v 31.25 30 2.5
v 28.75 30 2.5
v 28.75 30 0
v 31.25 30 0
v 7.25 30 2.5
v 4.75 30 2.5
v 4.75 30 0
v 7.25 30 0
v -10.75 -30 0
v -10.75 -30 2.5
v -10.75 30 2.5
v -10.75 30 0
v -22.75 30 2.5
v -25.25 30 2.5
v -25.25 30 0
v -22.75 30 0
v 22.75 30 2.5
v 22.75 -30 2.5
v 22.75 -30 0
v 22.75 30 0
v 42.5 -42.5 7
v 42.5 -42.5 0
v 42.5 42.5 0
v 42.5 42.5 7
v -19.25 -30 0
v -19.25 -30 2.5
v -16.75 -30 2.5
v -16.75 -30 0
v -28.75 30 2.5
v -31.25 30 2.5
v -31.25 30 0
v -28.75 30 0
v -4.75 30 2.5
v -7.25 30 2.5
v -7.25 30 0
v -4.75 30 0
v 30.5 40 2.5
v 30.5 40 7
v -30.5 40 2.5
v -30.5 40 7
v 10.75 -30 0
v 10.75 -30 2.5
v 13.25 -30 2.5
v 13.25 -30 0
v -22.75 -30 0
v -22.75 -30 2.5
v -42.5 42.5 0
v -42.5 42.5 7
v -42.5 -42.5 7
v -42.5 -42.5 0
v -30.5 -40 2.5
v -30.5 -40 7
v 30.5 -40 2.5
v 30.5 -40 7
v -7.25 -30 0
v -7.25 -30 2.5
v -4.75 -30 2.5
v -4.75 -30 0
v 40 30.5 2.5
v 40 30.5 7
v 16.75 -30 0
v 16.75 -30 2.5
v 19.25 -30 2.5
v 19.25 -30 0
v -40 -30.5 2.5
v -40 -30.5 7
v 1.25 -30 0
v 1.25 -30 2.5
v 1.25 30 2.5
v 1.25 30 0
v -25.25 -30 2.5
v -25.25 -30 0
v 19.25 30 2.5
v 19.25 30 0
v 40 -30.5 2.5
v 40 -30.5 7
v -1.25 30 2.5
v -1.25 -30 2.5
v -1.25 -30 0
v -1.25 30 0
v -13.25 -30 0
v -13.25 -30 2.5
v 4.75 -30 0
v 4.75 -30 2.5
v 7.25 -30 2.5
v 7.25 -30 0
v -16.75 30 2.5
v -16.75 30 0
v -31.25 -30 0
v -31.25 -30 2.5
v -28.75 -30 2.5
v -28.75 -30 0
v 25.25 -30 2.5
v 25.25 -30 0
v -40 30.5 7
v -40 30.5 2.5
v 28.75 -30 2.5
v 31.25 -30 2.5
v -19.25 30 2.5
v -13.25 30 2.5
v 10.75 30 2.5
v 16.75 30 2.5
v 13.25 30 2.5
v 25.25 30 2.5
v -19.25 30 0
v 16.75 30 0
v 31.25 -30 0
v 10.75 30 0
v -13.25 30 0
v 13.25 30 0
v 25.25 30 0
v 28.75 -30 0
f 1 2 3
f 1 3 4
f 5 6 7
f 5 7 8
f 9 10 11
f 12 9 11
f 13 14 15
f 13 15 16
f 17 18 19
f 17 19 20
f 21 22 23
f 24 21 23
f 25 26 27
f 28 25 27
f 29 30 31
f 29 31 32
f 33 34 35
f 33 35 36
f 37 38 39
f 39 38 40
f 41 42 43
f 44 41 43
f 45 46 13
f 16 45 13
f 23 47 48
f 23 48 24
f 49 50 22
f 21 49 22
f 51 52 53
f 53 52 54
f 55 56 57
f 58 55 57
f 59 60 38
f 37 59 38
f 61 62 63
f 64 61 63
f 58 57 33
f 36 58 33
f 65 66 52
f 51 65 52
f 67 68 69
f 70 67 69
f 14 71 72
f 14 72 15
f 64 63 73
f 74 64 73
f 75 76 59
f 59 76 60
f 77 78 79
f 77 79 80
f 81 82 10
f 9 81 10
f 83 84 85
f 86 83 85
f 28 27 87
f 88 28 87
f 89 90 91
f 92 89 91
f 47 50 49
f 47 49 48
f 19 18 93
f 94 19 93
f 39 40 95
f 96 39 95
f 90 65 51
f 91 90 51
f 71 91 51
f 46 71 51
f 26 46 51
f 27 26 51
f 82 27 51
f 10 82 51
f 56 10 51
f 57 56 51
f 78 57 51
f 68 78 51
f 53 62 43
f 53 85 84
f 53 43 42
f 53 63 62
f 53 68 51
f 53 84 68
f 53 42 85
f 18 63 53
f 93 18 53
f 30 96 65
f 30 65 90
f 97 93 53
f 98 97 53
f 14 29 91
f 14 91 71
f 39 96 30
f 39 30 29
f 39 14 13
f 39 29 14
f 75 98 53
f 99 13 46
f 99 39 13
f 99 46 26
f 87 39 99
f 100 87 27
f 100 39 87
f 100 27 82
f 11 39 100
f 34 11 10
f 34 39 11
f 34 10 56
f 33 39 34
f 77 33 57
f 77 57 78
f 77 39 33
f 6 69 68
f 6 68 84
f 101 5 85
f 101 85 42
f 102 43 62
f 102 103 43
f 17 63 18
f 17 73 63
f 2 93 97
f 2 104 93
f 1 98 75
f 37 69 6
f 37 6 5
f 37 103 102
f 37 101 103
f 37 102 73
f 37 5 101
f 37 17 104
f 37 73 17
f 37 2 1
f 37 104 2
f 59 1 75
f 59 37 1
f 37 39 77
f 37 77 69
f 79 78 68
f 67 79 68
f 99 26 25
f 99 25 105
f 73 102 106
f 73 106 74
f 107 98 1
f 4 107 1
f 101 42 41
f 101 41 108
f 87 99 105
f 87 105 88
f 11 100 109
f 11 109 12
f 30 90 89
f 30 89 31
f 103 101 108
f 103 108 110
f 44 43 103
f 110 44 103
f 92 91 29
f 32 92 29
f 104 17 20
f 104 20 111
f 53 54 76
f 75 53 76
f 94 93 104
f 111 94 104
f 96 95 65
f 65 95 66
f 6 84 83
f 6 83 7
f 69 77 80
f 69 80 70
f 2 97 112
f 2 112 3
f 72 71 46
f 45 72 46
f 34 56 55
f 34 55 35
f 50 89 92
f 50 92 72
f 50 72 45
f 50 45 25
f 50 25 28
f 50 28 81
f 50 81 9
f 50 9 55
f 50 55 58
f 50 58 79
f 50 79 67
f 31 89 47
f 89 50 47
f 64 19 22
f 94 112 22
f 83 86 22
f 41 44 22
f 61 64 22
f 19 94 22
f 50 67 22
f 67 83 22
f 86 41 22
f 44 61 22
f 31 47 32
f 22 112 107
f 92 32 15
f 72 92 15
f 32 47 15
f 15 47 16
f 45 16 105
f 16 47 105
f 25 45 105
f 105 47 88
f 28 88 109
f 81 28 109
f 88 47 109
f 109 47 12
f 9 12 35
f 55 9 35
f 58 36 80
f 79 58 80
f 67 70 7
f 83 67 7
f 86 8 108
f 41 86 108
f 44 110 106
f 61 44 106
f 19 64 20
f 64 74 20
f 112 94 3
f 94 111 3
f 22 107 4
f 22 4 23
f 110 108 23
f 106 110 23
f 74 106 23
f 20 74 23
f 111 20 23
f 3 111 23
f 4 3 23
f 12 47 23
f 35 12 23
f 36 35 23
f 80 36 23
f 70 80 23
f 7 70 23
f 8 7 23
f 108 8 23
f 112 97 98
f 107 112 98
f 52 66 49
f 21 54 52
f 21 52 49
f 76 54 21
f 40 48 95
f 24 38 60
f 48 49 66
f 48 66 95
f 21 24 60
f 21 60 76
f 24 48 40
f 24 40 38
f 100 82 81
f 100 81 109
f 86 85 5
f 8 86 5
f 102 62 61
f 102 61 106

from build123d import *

# Parameters (mm, degrees)
F0_W     = 85
F0_H     = 85
F1_DEPTH = 7
F3_DEPTH = 4.5
F4_W     = 2.5
F4_H     = 60
F5_DEPTH = 25


with BuildPart() as f1:
    # F0 (on Top) → F1 (new body)
    with BuildSketch(Plane.XY):
        Rectangle(F0_W, F0_H)
    extrude(amount=F1_DEPTH)

    # F2 (on face) → F3 (cut)
    with BuildSketch(Plane.XY.offset(7)):
        Polygon((30.5, 40), (-30.5, 40), (-40, 30.5), (-40, -30.5), (-30.5, -40), (30.5, -40), (40, -30.5), (40, 30.5), align=None)
    extrude(amount=-F3_DEPTH, mode=Mode.SUBTRACT)

    # F4 (on face) → F5 (cut)
    with BuildSketch(Plane.XY.offset(7)):
        with Locations((-30.000278, 0)):
            Rectangle(F4_W, F4_H)
        with Locations((-24.000278, 0)):
            Rectangle(F4_W, F4_H)
        with Locations((-18.000278, 0)):
            Rectangle(F4_W, F4_H)
        with Locations((-12.000278, 0)):
            Rectangle(F4_W, F4_H)
        with Locations((-6.000278, 0)):
            Rectangle(F4_W, F4_H)
        with Locations((-0.000278, 0)):
            Rectangle(F4_W, F4_H)
        with Locations((5.999722, 0)):
            Rectangle(F4_W, F4_H)
        with Locations((11.999722, 0)):
            Rectangle(F4_W, F4_H)
        with Locations((17.999722, 0)):
            Rectangle(F4_W, F4_H)
        with Locations((23.999722, 0)):
            Rectangle(F4_W, F4_H)
        with Locations((29.999722, 0)):
            Rectangle(F4_W, F4_H)
    extrude(amount=-F5_DEPTH, mode=Mode.SUBTRACT)


solid = f1.part
